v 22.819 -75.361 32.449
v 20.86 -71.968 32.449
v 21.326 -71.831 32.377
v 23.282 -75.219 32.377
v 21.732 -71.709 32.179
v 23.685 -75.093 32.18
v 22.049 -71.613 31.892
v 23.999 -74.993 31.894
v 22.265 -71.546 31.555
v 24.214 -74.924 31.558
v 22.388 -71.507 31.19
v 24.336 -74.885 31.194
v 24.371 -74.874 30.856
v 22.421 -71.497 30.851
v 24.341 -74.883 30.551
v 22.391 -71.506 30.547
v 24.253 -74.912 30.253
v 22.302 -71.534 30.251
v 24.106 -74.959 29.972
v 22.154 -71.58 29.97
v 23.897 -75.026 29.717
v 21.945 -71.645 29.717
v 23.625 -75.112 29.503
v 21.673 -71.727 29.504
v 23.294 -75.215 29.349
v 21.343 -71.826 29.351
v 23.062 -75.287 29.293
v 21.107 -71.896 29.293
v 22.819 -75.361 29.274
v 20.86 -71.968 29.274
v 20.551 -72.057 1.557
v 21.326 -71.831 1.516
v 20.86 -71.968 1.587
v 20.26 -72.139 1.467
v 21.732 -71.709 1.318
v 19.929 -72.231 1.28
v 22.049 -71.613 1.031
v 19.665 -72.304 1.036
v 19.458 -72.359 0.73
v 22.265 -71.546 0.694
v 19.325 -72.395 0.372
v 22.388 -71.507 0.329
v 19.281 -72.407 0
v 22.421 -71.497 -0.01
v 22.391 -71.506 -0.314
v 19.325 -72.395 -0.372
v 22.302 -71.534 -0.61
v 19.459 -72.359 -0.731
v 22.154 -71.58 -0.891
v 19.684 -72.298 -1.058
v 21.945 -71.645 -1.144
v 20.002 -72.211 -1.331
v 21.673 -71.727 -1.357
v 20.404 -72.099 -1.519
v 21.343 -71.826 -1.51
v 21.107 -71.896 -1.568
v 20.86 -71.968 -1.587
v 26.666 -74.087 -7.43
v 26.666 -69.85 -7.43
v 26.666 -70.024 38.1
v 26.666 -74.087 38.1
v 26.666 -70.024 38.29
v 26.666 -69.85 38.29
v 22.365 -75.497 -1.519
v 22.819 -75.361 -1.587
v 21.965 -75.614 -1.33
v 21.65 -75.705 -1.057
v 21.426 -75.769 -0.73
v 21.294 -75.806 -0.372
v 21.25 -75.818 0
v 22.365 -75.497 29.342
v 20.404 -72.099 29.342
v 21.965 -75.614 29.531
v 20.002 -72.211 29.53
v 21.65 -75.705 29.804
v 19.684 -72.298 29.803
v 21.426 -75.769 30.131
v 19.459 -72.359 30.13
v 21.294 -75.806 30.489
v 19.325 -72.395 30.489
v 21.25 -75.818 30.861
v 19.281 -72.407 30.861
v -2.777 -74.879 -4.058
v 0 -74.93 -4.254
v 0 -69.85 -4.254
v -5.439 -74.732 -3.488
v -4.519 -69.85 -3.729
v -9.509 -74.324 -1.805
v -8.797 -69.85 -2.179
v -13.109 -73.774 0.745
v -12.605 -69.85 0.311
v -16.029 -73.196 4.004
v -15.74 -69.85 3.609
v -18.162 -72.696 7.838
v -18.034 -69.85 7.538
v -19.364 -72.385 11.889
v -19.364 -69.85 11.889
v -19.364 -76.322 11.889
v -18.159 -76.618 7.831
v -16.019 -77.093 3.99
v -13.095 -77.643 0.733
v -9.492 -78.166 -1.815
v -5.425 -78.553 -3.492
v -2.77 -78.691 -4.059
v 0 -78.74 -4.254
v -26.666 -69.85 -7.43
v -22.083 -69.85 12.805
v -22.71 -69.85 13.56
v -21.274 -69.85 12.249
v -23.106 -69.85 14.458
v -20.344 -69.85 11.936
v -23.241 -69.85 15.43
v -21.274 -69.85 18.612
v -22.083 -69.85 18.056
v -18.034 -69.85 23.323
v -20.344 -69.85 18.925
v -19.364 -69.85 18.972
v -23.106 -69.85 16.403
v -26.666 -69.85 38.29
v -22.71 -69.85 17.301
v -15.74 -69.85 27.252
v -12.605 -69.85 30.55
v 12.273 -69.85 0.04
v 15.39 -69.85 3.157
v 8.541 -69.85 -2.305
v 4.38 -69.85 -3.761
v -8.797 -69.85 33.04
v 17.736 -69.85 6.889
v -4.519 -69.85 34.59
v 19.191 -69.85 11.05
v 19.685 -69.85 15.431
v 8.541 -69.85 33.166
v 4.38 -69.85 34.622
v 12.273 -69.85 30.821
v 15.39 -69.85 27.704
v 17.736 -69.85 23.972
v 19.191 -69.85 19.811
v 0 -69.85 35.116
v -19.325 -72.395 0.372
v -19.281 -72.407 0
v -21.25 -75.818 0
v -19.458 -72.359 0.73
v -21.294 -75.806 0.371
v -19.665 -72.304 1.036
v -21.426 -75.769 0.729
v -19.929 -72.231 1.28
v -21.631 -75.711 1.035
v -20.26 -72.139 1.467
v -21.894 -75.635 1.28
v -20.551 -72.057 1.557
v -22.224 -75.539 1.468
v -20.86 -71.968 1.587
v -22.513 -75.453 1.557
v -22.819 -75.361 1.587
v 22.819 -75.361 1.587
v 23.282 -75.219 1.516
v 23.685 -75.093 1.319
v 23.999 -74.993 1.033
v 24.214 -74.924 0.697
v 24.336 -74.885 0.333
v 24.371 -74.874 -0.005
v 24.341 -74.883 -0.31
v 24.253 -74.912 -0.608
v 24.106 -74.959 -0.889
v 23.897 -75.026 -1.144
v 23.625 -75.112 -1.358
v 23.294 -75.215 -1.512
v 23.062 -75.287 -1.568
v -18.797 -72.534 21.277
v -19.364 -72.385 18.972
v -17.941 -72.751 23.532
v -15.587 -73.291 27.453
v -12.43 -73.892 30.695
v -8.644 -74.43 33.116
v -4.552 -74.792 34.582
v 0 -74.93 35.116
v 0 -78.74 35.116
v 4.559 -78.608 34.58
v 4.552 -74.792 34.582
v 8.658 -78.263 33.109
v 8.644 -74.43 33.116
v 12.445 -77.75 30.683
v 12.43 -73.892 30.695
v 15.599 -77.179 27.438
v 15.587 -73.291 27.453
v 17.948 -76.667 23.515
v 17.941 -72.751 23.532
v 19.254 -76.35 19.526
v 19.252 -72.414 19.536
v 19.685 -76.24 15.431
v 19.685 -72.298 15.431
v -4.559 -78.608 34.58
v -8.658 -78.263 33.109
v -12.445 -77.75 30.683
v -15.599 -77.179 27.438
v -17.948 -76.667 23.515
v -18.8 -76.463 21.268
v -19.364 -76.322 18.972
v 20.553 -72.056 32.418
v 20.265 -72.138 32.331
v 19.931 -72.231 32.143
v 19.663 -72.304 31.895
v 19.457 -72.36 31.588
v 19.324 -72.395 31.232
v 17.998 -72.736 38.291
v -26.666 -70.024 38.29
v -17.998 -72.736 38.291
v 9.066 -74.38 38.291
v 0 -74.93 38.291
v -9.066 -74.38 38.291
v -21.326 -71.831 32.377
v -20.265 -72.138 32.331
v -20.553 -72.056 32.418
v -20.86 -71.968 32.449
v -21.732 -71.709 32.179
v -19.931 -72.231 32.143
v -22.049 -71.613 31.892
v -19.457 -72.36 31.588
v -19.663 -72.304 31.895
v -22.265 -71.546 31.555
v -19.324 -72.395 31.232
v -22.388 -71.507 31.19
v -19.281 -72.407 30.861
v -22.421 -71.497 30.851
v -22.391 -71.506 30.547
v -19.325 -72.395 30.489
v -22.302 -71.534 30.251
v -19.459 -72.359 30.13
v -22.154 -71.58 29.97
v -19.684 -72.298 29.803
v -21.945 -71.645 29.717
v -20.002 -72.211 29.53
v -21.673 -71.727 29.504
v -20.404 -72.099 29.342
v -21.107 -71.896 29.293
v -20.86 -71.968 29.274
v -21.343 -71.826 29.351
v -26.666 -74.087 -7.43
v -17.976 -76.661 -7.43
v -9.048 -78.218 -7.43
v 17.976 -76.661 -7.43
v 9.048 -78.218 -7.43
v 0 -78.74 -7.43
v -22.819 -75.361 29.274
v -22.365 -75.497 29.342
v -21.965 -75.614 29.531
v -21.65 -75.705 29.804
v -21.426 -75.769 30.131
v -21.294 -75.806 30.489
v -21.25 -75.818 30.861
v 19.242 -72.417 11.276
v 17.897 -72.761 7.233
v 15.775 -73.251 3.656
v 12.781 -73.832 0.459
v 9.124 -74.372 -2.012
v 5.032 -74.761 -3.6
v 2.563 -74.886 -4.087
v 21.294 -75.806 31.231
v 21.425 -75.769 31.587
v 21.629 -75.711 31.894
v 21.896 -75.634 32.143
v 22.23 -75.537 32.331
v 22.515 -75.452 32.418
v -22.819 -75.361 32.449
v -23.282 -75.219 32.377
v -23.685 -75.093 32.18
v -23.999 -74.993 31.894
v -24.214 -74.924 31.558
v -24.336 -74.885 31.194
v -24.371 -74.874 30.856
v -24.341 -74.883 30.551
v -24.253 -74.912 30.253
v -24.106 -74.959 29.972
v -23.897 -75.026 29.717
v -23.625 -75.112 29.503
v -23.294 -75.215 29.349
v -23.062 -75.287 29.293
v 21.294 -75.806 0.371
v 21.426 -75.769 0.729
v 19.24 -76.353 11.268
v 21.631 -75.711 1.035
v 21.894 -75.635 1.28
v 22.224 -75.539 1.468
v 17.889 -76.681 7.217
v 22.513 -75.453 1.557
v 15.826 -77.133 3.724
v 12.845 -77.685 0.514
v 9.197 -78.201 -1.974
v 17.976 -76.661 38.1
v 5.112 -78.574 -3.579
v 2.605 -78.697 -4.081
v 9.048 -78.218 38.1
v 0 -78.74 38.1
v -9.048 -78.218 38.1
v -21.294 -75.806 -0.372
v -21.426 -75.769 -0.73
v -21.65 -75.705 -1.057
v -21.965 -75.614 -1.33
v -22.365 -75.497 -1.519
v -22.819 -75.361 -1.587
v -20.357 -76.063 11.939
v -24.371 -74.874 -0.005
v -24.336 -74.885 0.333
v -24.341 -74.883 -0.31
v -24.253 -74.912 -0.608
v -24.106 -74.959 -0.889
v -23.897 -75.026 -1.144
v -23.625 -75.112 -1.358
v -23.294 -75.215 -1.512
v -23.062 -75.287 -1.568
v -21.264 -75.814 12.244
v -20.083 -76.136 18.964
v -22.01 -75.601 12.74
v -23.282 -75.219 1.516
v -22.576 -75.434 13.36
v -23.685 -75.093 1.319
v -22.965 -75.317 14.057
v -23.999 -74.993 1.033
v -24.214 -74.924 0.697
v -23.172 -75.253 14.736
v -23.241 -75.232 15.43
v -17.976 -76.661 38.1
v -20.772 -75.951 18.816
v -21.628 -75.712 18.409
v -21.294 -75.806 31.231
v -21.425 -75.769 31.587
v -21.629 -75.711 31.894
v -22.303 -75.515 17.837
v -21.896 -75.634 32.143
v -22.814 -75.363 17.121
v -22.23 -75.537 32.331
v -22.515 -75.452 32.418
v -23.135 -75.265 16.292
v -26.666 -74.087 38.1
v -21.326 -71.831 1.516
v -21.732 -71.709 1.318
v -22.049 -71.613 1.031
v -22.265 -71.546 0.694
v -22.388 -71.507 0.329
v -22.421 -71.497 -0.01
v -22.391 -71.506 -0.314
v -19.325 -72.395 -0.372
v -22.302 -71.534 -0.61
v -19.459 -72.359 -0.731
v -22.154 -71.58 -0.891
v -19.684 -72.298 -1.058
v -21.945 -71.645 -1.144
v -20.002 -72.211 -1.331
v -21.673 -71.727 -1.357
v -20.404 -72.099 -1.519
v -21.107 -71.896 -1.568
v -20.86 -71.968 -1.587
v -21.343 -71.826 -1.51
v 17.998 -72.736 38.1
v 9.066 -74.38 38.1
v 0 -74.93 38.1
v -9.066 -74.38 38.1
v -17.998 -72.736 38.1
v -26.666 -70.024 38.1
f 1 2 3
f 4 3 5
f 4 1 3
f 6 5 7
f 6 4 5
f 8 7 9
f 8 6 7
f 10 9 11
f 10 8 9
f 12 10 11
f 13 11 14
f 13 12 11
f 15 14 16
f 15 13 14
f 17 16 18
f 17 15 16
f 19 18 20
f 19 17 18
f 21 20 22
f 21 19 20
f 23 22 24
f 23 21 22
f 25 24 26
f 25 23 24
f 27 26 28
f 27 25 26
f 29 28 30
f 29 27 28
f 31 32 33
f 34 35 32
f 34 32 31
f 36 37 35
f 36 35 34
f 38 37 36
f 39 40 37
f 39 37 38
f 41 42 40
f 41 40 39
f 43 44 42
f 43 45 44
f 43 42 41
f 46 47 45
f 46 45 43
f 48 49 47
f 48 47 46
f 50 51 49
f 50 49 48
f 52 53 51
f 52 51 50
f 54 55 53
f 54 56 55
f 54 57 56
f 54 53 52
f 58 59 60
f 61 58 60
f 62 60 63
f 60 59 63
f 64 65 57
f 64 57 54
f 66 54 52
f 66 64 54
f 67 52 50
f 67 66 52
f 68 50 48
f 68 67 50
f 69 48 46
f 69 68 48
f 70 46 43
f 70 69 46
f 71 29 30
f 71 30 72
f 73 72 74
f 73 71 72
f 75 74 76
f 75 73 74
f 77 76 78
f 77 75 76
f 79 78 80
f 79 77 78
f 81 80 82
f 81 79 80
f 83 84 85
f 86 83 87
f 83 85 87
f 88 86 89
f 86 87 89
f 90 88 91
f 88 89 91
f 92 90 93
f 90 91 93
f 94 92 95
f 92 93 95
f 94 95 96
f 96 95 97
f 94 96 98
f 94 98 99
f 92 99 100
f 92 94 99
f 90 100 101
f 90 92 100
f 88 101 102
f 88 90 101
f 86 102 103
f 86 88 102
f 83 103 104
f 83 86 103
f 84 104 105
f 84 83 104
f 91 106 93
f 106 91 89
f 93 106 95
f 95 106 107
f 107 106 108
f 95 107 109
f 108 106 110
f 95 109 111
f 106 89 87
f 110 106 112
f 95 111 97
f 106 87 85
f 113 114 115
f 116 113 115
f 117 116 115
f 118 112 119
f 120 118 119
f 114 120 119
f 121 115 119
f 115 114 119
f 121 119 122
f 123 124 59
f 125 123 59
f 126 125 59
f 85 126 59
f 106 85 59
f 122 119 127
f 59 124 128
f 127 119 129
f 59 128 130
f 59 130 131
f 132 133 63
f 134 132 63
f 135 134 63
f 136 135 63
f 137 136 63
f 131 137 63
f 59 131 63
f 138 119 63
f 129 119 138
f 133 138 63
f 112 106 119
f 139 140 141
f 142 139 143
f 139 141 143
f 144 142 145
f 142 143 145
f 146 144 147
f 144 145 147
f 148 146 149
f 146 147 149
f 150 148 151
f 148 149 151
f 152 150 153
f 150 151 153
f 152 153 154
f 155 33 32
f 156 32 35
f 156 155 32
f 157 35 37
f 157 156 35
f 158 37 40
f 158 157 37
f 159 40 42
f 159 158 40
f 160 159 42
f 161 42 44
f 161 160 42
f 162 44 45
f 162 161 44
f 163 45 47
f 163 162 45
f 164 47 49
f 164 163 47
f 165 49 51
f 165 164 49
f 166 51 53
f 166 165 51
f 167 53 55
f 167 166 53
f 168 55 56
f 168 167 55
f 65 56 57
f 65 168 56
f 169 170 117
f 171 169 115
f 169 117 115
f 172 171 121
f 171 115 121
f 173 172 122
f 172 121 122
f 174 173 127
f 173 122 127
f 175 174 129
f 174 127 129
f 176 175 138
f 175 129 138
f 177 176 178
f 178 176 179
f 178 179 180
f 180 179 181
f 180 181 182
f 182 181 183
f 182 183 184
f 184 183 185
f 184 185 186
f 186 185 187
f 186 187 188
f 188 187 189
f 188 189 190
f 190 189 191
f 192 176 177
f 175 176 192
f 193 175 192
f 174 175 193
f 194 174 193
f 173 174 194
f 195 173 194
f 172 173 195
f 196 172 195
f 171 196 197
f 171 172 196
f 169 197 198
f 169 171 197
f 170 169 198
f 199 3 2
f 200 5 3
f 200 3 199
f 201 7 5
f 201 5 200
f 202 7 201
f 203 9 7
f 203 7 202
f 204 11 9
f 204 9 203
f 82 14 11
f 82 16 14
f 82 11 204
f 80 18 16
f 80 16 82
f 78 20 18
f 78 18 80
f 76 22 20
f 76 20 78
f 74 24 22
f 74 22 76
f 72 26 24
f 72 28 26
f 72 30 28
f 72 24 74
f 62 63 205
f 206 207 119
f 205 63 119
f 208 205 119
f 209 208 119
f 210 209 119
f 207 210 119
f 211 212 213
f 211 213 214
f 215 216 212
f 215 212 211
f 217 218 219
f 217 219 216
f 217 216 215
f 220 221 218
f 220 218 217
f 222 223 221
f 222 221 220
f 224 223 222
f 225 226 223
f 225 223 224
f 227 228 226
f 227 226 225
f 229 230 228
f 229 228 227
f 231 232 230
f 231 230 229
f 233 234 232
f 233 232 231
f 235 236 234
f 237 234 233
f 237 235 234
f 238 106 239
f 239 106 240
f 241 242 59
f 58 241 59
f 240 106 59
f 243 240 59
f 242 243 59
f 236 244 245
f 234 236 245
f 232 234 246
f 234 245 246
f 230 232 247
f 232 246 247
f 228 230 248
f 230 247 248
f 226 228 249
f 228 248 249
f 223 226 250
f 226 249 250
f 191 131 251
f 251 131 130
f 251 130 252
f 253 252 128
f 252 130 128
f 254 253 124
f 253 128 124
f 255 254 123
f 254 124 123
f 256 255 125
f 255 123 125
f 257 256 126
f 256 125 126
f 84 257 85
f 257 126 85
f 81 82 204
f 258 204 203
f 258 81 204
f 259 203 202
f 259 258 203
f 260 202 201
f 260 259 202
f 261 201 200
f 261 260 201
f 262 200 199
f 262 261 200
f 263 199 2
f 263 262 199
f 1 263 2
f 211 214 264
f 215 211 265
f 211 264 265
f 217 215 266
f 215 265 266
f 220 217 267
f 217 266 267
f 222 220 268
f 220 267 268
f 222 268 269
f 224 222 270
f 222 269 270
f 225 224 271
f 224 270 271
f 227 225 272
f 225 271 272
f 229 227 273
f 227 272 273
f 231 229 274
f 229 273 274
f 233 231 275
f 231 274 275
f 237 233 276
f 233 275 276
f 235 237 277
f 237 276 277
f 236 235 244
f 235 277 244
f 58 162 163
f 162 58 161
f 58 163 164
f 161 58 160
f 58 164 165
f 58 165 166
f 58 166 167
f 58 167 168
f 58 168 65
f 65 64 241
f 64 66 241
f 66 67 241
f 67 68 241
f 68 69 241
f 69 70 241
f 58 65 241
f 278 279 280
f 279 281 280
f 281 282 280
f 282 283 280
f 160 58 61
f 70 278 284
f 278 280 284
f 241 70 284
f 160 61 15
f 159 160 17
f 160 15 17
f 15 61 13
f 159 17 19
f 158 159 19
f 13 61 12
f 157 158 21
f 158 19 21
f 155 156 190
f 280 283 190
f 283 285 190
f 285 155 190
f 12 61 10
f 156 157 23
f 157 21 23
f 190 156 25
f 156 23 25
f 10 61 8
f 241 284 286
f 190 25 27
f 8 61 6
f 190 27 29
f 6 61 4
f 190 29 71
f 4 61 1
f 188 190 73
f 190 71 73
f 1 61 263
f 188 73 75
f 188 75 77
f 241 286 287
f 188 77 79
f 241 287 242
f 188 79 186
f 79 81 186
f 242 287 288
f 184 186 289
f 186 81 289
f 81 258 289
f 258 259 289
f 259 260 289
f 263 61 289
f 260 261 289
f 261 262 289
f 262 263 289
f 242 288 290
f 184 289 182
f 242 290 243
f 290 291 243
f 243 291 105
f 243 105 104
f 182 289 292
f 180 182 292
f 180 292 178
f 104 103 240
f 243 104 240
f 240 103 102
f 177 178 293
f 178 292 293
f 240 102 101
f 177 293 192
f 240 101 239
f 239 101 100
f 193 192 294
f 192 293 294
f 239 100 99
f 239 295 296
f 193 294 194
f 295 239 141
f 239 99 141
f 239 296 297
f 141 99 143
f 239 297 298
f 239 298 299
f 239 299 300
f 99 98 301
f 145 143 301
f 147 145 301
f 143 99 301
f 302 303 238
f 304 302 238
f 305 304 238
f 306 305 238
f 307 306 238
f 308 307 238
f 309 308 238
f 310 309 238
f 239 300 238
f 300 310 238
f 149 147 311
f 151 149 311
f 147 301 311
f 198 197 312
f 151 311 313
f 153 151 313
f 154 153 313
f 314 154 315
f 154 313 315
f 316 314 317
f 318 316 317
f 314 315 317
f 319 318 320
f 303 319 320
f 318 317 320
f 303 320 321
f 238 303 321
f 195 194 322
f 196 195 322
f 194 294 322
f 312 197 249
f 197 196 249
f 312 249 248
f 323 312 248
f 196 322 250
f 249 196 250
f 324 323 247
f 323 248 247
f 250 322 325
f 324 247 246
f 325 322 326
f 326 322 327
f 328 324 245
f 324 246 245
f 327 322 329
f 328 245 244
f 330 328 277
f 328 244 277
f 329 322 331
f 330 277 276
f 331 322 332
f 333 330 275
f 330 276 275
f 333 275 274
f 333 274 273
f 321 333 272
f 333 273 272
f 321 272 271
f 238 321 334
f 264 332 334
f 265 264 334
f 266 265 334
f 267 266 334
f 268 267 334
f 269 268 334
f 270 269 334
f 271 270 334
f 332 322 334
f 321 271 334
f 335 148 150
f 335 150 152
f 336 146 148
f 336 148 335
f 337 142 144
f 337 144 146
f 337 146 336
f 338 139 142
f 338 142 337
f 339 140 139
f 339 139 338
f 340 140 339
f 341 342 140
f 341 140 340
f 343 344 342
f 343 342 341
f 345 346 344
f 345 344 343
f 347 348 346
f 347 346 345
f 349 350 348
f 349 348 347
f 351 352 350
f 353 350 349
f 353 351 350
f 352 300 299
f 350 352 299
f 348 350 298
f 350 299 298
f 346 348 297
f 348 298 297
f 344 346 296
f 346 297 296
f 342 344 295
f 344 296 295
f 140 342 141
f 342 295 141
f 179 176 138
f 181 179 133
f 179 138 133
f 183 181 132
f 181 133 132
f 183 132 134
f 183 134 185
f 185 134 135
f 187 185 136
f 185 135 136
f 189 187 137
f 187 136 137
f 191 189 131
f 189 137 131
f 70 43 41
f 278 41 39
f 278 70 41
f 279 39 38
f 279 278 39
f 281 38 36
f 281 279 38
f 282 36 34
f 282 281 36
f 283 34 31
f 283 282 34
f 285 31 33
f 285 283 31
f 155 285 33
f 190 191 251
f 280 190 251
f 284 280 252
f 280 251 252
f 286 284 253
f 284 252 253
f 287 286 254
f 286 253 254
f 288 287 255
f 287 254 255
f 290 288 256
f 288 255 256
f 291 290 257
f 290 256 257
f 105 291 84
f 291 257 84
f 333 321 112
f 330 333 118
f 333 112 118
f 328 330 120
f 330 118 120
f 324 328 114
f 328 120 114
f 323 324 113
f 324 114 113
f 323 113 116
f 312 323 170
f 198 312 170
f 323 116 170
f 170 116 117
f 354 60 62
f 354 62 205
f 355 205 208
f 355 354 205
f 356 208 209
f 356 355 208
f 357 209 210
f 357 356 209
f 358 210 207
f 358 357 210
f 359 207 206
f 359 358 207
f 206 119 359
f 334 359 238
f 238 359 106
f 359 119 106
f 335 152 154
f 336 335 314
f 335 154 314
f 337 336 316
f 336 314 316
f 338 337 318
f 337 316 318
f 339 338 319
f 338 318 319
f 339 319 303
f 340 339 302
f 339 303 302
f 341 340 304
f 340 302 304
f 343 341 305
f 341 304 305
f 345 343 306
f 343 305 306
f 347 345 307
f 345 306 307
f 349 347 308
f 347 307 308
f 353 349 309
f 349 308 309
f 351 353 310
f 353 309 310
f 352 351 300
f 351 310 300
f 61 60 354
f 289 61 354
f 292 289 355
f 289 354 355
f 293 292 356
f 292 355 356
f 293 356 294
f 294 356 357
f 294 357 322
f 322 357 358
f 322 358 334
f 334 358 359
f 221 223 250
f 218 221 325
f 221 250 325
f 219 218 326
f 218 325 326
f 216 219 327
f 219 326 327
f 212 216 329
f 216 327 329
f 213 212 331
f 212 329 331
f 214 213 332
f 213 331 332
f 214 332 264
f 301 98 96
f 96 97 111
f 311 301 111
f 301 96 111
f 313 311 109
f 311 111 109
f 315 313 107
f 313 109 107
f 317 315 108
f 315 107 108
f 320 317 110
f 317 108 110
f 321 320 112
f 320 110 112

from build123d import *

# Parameters (mm, degrees)
F0_R           = 78.74
F0_R_2         = 74.93
F1_DEPTH       = 38.1
F2_R           = 1.5875
F3_DEPTH       = 177.8
F7_DEPTH       = 25.4
F8_W           = 170.1503526419
F8_H           = 177.0643368363
F9_DEPTH       = 76.2
F12_END_RADIUS = 74.93
F12_REACH      = 113.8647376176
F13_DEPTH      = 69.85
F15_DEPTH      = 8.8910001


with BuildPart() as f1:
    # F0 (on Top) → F1 (new body, symmetric)
    with BuildSketch(Plane.XY):
        Circle(F0_R)
        Circle(F0_R_2, mode=Mode.SUBTRACT)
    extrude(amount=F1_DEPTH, both=True)

    # F2 (on Front) → F3 (intersect)
    with BuildSketch(Plane.XZ):
        with BuildLine():
            ThreePointArc((-19.685, 15.4305), (-13.9193969877, 29.3498969877), (0, 35.1155))
            Line((0, 35.1155), (0, 38.2905))
            Line((0, 38.2905), (-26.6664084047, 38.2905))
            Line((-26.6664084047, 38.2905), (-26.6664084047, 15.4305))
            Line((-26.6664084047, 15.4305), (-19.685, 15.4305))
        make_face()
        with Locations((-23.8125, 30.861)):
            Circle(F2_R, mode=Mode.SUBTRACT)
        with BuildLine():
            Line((0, -7.4295), (0, -4.2545))
            ThreePointArc((0, -4.2545), (-13.9193969877, 1.5111030123), (-19.685, 15.4305))
            Line((-19.685, 15.4305), (-26.6664084047, 15.4305))
            Line((-26.6664084047, 15.4305), (-26.6664084047, -7.4295))
            Line((-26.6664084047, -7.4295), (0, -7.4295))
        make_face()
        with Locations((-23.8125, 0)):
            Circle(F2_R, mode=Mode.SUBTRACT)
        with BuildLine():
            Line((26.6664084047, 15.4305), (19.685, 15.4305))
            ThreePointArc((19.685, 15.4305), (13.9193969877, 1.5111030123), (0, -4.2545))
            Line((0, -4.2545), (0, -7.4295))
            Line((0, -7.4295), (26.6664084047, -7.4295))
            Line((26.6664084047, -7.4295), (26.6664084047, 15.4305))
        make_face()
        with Locations((23.8125, 0)):
            Circle(F2_R, mode=Mode.SUBTRACT)
        with BuildLine():
            ThreePointArc((0, 35.1155), (13.9193969877, 29.3498969877), (19.685, 15.4305))
            Line((19.685, 15.4305), (26.6664084047, 15.4305))
            Line((26.6664084047, 15.4305), (26.6664084047, 38.2905))
            Line((26.6664084047, 38.2905), (0, 38.2905))
            Line((0, 38.2905), (0, 35.1155))
        make_face()
        with Locations((23.8125, 30.861)):
            Circle(F2_R, mode=Mode.SUBTRACT)
        with Locations((-23.8125, 30.861)):
            Circle(F2_R)
        with Locations((23.8125, 30.861)):
            Circle(F2_R)
        with Locations((-23.8125, 0)):
            Circle(F2_R)
        with Locations((23.8125, 0)):
            Circle(F2_R)
    extrude(amount=F3_DEPTH, mode=Mode.INTERSECT)

    # F6 (on face) → F7 (cut)
    with BuildSketch(Plane(origin=(38.7472337077, -67.1121774345, 0), x_dir=(-0.8660254038, -0.5, 0), z_dir=(-0.5, 0.8660254038, 0))):
        with BuildLine():
            ThreePointArc((19.5060294768, 0), (19.041061492, 1.1225320151), (17.9185294768, 1.5875))
            Line((17.9185294768, 1.5875), (17.9185294768, -1.5875))
            ThreePointArc((17.9185294768, -1.5875), (19.041061492, -1.1225320151), (19.5060294768, 0))
        make_face()
        with BuildLine():
            Line((17.9185294768, -1.5875), (17.9185294768, 1.5875))
            ThreePointArc((17.9185294768, 1.5875), (16.3310294768, 0), (17.9185294768, -1.5875))
        make_face()
        with BuildLine():
            ThreePointArc((19.5060294768, 30.861), (19.041061492, 31.9835320151), (17.9185294768, 32.4485))
            Line((17.9185294768, 32.4485), (17.9185294768, 29.2735))
            ThreePointArc((17.9185294768, 29.2735), (19.041061492, 29.7384679849), (19.5060294768, 30.861))
        make_face()
        with BuildLine():
            Line((17.9185294768, 29.2735), (17.9185294768, 32.4485))
            ThreePointArc((17.9185294768, 32.4485), (16.3310294768, 30.861), (17.9185294768, 29.2735))
        make_face()
    extrude(amount=F7_DEPTH, mode=Mode.SUBTRACT)

    # F8 (on Right) → F9 (cut)
    with BuildSketch(Plane.YZ):
        with Locations((-62.6385295764, 18.013317138)):
            Rectangle(F8_W, F8_H)
    extrude(amount=-F9_DEPTH, mode=Mode.SUBTRACT)

    # F10: F1 across plane


with BuildPart() as f1_1:
    add(f1.part)
    add(f1.part.mirror(Plane.YZ))

    f12_end = (Plane(origin=(0, 0, 15.33525), x_dir=(-1, 0, 0), z_dir=(0, 0, -1)) * Cylinder(F12_END_RADIUS, 369.0558714917, mode=Mode.PRIVATE)).faces().sort_by_distance((0, -74.93, -6.7265497667))[0]
    # F2 (on Front) → F12 (join, up to the whole of a round face its end follows)
    with BuildSketch(Plane.XZ):
        with BuildLine():
            ThreePointArc((0, 35.1155), (13.9193969877, 29.3498969877), (19.685, 15.4305))
            Line((19.685, 15.4305), (26.6664084047, 15.4305))
            Line((26.6664084047, 15.4305), (26.6664084047, 38.2905))
            Line((26.6664084047, 38.2905), (0, 38.2905))
            Line((0, 38.2905), (0, 35.1155))
        make_face()
        with Locations((23.8125, 30.861)):
            Circle(F2_R, mode=Mode.SUBTRACT)
        with BuildLine():
            ThreePointArc((-19.685, 15.4305), (-13.9193969877, 29.3498969877), (0, 35.1155))
            Line((0, 35.1155), (0, 38.2905))
            Line((0, 38.2905), (-26.6664084047, 38.2905))
            Line((-26.6664084047, 38.2905), (-26.6664084047, 15.4305))
            Line((-26.6664084047, 15.4305), (-19.685, 15.4305))
        make_face()
        with Locations((-23.8125, 30.861)):
            Circle(F2_R, mode=Mode.SUBTRACT)
        with BuildLine():
            Line((0, -7.4295), (0, -4.2545))
            ThreePointArc((0, -4.2545), (-13.9193969877, 1.5111030123), (-19.685, 15.4305))
            Line((-19.685, 15.4305), (-26.6664084047, 15.4305))
            Line((-26.6664084047, 15.4305), (-26.6664084047, -7.4295))
            Line((-26.6664084047, -7.4295), (0, -7.4295))
        make_face()
        with Locations((-23.8125, 0)):
            Circle(F2_R, mode=Mode.SUBTRACT)
        with BuildLine():
            Line((26.6664084047, 15.4305), (19.685, 15.4305))
            ThreePointArc((19.685, 15.4305), (13.9193969877, 1.5111030123), (0, -4.2545))
            Line((0, -4.2545), (0, -7.4295))
            Line((0, -7.4295), (26.6664084047, -7.4295))
            Line((26.6664084047, -7.4295), (26.6664084047, 15.4305))
        make_face()
        with Locations((23.8125, 0)):
            Circle(F2_R, mode=Mode.SUBTRACT)
        with Locations((-23.8125, 0)):
            Circle(F2_R)
        with Locations((-23.8125, 30.861)):
            Circle(F2_R)
        with Locations((23.8125, 30.861)):
            Circle(F2_R)
        with Locations((23.8125, 0)):
            Circle(F2_R)
    f12_long = extrude(amount=F12_REACH, mode=Mode.PRIVATE)
    add(split(f12_long, bisect_by=f12_end, keep=Keep.BOTTOM, mode=Mode.PRIVATE))

    # F2 (on Front) → F13 (cut)
    with BuildSketch(Plane.XZ):
        with BuildLine():
            Line((26.6664084047, 15.4305), (19.685, 15.4305))
            ThreePointArc((19.685, 15.4305), (13.9193969877, 1.5111030123), (0, -4.2545))
            Line((0, -4.2545), (0, -7.4295))
            Line((0, -7.4295), (26.6664084047, -7.4295))
            Line((26.6664084047, -7.4295), (26.6664084047, 15.4305))
        make_face()
        with Locations((23.8125, 0)):
            Circle(F2_R, mode=Mode.SUBTRACT)
        with BuildLine():
            ThreePointArc((-19.685, 15.4305), (-13.9193969877, 29.3498969877), (0, 35.1155))
            Line((0, 35.1155), (0, 38.2905))
            Line((0, 38.2905), (-26.6664084047, 38.2905))
            Line((-26.6664084047, 38.2905), (-26.6664084047, 15.4305))
            Line((-26.6664084047, 15.4305), (-19.685, 15.4305))
        make_face()
        with Locations((-23.8125, 30.861)):
            Circle(F2_R, mode=Mode.SUBTRACT)
        with BuildLine():
            Line((0, -7.4295), (0, -4.2545))
            ThreePointArc((0, -4.2545), (-13.9193969877, 1.5111030123), (-19.685, 15.4305))
            Line((-19.685, 15.4305), (-26.6664084047, 15.4305))
            Line((-26.6664084047, 15.4305), (-26.6664084047, -7.4295))
            Line((-26.6664084047, -7.4295), (0, -7.4295))
        make_face()
        with Locations((-23.8125, 0)):
            Circle(F2_R, mode=Mode.SUBTRACT)
        with BuildLine():
            ThreePointArc((0, 35.1155), (13.9193969877, 29.3498969877), (19.685, 15.4305))
            Line((19.685, 15.4305), (26.6664084047, 15.4305))
            Line((26.6664084047, 15.4305), (26.6664084047, 38.2905))
            Line((26.6664084047, 38.2905), (0, 38.2905))
            Line((0, 38.2905), (0, 35.1155))
        make_face()
        with Locations((23.8125, 30.861)):
            Circle(F2_R, mode=Mode.SUBTRACT)
        with Locations((-23.8125, 0)):
            Circle(F2_R)
        with Locations((23.8125, 0)):
            Circle(F2_R)
        with Locations((23.8125, 30.861)):
            Circle(F2_R)
        with Locations((-23.8125, 30.861)):
            Circle(F2_R)
    extrude(amount=F13_DEPTH, mode=Mode.SUBTRACT)

    # F14 (on face) → F15 (cut, through all)
    with BuildSketch(Plane(origin=(0, -69.85, 0), x_dir=(-1, 0, 0), z_dir=(0, 1, 0))):
        with BuildLine():
            ThreePointArc((19.3638129032, 18.971965071), (19.6045387857, 17.2085), (19.685, 15.4305))
            ThreePointArc((19.685, 15.4305), (19.6045387857, 13.6525), (19.3638129032, 11.889034929))
            ThreePointArc((19.3638129032, 11.889034929), (22.0832279587, 12.8049260326), (23.241, 15.4305))
            ThreePointArc((23.241, 15.4305), (22.0832279587, 18.0560739674), (19.3638129032, 18.971965071))
        make_face()
        with BuildLine():
            ThreePointArc((19.3638129032, 11.889034929), (19.6045387857, 13.6525), (19.685, 15.4305))
            Line((19.685, 15.4305), (16.129, 15.4305))
            ThreePointArc((16.129, 15.4305), (17.0594260326, 13.0322720413), (19.3638129032, 11.889034929))
        make_face()
    extrude(amount=-F15_DEPTH, mode=Mode.SUBTRACT)


solid = f1_1.part
